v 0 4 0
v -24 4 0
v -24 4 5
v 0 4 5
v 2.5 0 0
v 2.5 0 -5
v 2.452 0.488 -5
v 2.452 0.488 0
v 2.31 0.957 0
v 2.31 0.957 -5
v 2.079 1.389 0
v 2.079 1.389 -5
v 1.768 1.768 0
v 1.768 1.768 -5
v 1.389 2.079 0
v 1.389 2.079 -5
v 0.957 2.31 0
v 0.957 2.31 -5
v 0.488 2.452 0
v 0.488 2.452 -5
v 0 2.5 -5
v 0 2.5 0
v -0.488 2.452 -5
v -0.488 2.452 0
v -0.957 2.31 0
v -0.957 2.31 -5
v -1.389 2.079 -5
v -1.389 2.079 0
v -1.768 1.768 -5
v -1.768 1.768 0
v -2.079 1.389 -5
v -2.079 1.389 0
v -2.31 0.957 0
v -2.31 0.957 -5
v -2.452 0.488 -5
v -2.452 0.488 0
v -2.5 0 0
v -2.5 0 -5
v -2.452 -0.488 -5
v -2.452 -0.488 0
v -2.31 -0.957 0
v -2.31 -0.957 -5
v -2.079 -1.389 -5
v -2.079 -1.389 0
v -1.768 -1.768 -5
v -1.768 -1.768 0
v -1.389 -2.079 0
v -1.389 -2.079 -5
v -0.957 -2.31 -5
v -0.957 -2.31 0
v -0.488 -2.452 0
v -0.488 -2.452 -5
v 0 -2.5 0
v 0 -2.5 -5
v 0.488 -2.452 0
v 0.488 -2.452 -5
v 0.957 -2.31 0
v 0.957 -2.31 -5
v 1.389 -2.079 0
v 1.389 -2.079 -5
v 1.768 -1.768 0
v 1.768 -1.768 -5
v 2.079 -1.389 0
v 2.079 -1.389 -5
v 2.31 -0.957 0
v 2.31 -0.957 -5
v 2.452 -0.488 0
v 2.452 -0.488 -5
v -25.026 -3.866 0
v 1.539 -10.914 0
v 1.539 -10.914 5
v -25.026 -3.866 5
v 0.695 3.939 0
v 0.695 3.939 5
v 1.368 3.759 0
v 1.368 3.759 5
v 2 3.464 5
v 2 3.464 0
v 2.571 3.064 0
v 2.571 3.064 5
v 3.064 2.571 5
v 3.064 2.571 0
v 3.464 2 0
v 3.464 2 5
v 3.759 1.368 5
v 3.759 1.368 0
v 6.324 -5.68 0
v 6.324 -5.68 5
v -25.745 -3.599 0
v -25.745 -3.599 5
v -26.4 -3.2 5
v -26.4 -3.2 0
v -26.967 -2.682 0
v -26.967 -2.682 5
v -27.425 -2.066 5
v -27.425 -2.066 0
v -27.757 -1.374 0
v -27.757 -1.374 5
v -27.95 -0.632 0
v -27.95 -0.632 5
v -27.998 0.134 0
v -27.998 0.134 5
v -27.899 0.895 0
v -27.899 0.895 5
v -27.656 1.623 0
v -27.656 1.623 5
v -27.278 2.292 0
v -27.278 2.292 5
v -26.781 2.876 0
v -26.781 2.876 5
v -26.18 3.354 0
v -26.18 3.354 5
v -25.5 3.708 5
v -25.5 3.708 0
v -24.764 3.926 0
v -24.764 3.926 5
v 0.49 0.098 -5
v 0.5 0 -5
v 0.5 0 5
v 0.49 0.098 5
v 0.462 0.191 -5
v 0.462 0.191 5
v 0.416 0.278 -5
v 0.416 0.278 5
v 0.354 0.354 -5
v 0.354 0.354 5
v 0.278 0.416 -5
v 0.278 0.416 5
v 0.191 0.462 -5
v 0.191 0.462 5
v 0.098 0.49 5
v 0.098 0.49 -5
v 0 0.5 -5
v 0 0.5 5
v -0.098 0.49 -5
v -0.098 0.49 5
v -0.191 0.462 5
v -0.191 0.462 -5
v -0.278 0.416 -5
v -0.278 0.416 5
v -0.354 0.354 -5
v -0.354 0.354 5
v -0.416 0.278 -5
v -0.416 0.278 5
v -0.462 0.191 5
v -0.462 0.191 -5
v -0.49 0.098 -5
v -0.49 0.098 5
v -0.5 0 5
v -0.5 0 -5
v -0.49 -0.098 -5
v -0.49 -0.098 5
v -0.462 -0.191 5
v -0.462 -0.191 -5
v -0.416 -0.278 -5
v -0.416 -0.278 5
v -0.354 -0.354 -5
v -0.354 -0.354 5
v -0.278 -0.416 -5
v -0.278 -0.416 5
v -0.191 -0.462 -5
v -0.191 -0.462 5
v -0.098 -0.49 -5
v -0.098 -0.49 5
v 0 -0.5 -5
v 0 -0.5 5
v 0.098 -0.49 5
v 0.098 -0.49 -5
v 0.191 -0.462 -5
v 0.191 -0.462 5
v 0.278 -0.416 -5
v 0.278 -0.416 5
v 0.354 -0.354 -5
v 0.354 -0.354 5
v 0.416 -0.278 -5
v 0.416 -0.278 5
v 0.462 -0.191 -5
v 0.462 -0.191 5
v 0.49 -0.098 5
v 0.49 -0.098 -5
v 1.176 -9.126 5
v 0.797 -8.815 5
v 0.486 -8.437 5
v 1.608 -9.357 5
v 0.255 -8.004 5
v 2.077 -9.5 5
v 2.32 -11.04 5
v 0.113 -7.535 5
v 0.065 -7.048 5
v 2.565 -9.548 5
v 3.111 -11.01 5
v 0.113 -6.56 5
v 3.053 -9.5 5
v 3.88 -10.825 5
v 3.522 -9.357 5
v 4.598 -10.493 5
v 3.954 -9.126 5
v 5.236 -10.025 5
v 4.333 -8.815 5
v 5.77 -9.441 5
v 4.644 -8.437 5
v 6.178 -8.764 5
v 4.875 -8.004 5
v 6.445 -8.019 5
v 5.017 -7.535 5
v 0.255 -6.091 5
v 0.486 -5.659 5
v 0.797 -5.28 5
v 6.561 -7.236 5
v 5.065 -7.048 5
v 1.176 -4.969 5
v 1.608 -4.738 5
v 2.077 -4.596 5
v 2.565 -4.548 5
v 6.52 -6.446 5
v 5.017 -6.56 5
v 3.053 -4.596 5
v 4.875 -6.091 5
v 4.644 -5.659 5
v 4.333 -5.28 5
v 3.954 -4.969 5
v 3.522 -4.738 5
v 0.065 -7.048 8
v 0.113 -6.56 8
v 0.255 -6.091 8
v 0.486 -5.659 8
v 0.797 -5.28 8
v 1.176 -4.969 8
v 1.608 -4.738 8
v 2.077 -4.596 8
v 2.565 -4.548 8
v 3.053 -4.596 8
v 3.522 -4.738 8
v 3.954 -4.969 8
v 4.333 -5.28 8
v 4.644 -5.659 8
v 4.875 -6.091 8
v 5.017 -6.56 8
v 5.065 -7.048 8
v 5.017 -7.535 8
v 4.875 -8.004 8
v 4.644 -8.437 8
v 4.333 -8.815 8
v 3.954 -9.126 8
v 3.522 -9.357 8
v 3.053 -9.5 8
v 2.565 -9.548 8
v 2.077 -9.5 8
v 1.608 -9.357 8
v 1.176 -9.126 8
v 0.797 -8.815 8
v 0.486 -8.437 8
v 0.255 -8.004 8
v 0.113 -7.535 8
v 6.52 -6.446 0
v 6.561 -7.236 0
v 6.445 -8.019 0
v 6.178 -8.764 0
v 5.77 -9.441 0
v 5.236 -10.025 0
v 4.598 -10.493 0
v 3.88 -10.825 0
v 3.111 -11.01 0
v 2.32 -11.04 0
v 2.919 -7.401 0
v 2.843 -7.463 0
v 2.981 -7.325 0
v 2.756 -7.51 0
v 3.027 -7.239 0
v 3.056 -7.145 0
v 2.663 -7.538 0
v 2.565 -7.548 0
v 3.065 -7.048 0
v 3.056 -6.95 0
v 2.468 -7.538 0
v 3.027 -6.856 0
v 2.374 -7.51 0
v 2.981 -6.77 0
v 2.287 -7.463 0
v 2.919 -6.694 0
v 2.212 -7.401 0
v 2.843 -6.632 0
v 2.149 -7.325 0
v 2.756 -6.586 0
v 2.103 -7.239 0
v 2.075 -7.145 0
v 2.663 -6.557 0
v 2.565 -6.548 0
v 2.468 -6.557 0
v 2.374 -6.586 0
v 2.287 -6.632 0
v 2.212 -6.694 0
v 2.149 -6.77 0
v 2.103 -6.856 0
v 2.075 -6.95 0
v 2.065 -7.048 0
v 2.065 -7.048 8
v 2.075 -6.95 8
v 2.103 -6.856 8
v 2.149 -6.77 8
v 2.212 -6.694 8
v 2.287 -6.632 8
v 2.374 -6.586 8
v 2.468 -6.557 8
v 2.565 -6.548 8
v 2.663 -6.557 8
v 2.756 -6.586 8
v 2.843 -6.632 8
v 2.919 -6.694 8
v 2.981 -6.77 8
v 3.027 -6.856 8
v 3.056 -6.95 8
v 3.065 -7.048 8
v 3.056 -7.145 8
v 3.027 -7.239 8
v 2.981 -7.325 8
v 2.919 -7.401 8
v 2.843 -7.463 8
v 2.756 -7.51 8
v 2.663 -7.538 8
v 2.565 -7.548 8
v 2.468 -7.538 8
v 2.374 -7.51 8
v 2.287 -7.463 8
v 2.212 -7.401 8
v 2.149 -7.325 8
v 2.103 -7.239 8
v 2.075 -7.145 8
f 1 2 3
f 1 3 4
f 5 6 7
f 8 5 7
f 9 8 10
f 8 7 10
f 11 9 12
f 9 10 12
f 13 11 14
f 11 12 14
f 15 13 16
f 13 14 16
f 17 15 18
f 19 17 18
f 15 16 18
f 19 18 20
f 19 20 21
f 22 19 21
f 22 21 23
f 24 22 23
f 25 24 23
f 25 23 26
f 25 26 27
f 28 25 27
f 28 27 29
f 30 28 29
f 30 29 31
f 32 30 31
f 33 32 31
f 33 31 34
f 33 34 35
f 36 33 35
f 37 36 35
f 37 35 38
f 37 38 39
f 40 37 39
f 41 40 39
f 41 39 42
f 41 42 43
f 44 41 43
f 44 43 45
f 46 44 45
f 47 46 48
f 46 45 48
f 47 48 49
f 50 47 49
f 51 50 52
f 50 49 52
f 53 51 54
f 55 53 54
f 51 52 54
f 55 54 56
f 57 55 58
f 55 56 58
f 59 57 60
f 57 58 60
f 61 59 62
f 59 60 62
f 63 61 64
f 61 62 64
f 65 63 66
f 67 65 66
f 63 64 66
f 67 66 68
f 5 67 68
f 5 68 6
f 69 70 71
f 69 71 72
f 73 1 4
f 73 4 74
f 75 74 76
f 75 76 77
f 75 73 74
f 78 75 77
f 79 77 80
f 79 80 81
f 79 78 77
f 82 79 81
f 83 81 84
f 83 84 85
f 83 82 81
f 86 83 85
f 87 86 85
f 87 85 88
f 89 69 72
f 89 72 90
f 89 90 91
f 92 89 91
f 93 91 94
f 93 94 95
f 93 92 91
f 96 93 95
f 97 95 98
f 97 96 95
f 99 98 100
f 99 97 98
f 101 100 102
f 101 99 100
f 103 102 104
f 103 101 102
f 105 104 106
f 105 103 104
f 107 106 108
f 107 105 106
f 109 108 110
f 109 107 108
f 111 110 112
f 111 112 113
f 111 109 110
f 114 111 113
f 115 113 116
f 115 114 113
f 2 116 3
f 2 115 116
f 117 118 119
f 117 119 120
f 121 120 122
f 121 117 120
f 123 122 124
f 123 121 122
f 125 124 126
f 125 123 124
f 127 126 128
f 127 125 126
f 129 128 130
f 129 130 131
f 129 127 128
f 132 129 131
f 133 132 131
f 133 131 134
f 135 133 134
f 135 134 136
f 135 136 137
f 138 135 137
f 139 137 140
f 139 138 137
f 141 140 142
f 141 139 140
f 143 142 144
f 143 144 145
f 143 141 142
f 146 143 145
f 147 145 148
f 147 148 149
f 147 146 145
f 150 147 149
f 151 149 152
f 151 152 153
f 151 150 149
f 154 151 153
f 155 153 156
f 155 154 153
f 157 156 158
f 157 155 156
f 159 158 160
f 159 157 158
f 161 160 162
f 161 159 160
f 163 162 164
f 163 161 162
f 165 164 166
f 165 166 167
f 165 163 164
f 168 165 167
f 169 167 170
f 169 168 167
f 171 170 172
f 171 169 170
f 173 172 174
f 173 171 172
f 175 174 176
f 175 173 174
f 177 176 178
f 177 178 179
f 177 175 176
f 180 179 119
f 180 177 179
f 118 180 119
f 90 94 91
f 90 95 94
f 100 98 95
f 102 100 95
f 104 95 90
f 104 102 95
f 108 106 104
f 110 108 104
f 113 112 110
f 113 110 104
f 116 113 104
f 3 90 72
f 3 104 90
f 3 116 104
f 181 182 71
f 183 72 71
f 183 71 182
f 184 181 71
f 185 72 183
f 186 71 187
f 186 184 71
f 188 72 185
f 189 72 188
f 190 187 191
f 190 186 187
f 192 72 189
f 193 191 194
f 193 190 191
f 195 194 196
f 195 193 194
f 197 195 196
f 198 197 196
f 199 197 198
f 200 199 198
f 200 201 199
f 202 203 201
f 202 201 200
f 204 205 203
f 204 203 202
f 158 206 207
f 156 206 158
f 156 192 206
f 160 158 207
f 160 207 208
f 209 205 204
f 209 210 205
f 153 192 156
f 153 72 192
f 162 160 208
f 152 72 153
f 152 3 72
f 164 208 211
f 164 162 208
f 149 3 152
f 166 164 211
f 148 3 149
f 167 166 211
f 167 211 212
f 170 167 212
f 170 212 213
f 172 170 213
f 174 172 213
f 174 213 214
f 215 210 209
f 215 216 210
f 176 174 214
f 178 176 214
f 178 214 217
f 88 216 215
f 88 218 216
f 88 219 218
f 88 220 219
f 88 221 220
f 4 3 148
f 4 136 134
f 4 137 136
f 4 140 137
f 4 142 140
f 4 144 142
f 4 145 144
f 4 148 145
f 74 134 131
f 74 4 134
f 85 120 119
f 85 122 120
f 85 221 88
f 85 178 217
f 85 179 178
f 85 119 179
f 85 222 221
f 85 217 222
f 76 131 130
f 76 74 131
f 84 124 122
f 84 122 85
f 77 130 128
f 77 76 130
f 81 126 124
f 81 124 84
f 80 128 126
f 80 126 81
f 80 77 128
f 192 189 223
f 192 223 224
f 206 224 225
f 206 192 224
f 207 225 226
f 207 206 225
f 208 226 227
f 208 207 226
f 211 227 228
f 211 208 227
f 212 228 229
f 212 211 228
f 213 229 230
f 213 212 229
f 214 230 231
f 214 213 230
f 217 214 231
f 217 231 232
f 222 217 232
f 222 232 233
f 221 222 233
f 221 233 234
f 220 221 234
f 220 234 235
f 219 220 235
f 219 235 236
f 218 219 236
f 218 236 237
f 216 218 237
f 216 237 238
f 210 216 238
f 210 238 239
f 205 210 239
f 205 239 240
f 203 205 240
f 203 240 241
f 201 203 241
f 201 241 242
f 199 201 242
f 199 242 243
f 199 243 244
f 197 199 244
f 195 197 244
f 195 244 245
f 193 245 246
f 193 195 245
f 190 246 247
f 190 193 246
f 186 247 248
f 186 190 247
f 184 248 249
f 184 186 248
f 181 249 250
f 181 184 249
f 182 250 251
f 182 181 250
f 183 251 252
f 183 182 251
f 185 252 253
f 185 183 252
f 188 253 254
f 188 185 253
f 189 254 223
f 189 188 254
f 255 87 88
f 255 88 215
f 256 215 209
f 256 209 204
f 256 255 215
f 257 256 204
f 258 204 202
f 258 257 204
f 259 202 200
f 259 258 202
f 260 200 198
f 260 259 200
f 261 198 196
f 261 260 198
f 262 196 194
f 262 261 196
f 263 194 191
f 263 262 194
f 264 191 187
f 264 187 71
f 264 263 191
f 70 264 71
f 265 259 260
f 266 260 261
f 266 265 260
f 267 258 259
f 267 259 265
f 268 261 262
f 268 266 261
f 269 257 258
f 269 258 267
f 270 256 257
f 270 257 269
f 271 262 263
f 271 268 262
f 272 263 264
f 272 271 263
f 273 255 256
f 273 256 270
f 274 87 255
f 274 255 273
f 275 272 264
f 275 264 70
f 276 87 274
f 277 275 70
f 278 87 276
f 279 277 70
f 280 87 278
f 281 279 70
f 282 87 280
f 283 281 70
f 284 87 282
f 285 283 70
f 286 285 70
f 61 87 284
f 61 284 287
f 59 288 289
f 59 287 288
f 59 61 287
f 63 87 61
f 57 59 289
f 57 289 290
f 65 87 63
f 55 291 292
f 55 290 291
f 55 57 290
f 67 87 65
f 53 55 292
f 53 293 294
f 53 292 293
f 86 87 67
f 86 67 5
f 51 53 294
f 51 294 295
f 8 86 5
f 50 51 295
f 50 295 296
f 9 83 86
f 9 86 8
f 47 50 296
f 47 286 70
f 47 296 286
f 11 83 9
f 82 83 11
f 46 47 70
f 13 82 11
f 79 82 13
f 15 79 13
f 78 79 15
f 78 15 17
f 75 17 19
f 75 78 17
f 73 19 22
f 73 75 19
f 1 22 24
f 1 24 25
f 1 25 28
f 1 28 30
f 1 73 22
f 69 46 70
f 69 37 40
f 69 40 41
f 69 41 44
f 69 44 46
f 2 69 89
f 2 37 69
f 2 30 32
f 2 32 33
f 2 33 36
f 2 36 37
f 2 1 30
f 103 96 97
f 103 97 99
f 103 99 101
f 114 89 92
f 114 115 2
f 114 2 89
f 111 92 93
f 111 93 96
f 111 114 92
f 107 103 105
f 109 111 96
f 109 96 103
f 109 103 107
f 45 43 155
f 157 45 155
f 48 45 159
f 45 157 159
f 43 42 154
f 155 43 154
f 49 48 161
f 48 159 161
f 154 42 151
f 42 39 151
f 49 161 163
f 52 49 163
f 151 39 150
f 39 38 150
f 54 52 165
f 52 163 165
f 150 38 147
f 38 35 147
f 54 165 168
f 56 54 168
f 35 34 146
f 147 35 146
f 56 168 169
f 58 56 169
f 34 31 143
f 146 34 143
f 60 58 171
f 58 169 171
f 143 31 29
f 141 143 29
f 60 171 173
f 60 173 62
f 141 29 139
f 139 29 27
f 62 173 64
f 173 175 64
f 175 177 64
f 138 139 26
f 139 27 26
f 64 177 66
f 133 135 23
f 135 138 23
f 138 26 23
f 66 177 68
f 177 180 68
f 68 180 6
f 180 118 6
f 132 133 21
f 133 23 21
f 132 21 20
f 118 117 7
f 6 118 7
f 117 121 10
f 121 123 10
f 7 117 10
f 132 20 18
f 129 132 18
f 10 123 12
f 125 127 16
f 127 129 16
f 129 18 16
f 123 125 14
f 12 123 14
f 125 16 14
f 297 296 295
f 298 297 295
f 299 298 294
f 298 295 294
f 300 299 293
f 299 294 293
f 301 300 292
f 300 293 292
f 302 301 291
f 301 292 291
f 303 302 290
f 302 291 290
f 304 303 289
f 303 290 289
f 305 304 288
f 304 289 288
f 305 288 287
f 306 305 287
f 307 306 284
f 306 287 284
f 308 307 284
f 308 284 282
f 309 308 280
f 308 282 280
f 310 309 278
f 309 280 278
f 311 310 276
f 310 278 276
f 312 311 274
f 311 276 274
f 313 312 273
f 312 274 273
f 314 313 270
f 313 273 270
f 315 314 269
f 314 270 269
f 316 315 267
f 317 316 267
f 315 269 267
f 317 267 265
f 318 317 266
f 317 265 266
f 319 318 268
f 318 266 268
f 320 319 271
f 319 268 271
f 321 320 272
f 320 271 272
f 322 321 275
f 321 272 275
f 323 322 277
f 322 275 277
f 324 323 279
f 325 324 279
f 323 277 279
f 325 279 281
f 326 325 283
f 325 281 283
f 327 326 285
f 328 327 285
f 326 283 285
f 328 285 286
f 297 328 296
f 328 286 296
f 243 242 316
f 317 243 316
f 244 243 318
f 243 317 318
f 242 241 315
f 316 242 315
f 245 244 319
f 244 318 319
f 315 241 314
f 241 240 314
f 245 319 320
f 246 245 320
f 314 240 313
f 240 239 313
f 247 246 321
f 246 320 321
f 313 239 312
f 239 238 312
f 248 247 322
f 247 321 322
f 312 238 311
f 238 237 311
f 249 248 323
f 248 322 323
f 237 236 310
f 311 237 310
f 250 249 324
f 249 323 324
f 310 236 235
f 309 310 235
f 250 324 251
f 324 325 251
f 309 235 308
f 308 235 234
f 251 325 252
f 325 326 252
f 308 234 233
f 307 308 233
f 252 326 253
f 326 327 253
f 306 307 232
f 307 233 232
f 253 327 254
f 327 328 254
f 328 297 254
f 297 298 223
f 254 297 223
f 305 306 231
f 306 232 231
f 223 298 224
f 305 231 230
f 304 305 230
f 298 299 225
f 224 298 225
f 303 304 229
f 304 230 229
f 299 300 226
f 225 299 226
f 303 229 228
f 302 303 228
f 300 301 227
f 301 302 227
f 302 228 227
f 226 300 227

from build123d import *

# Parameters (mm, degrees)
SKETCH2_R           = 2.5
BOSS_EXTRUDE1_DEPTH = 5
BOSS_EXTRUDE2_START = -10
SKETCH3_R           = 2.5
SKETCH3_R_2         = 0.5
BOSS_EXTRUDE2_DEPTH = 10
SKETCH4_R           = 2.5
SKETCH4_R_2         = 0.5
BOSS_EXTRUDE3_DEPTH = 8
SKETCH5_R           = 2.5
BOSS_EXTRUDE4_DEPTH = 5


with BuildPart() as part:
    # Sketch2 → Boss-Extrude1 (new body)
    with BuildSketch(Plane.XY):
        with BuildLine():
            Line((-24, 4), (0, 4))
            ThreePointArc((0, 4), (2.294305745, 3.276608177), (3.758770483, 1.368080573))
            Line((3.758770483, 1.368080573), (6.323921558, -5.679614083))
            ThreePointArc((6.323921558, -5.679614083), (5.517602021, -9.746404239), (1.539439822, -10.913948195))
            Line((1.539439822, -10.913948195), (-25.025711253, -3.866253539))
            ThreePointArc((-25.025711253, -3.866253539), (-27.966422453, 0.51719718), (-24, 4))
        make_face()
        with Locations((-24, 0)):
            Circle(SKETCH2_R, mode=Mode.SUBTRACT)
        Circle(SKETCH2_R, mode=Mode.SUBTRACT)
        with Locations((2.565151075, -7.047694656)):
            Circle(SKETCH2_R, mode=Mode.SUBTRACT)
    extrude(amount=BOSS_EXTRUDE1_DEPTH)

    # Sketch3 → Boss-Extrude2 (add)
    with BuildSketch(Plane.XY.offset(5).offset(BOSS_EXTRUDE2_START)):
        Circle(SKETCH3_R)
        Circle(SKETCH3_R_2, mode=Mode.SUBTRACT)
    extrude(amount=BOSS_EXTRUDE2_DEPTH)

    # Sketch4 → Boss-Extrude3 (add)
    with BuildSketch(Plane(origin=(0, 0, 0), x_dir=(-1, 0, 0), z_dir=(0, 0, -1))):
        with Locations((-2.565151075, -7.047694656)):
            Circle(SKETCH4_R)
        with Locations((-2.565151075, -7.047694656)):
            Circle(SKETCH4_R_2, mode=Mode.SUBTRACT)
    extrude(amount=-BOSS_EXTRUDE3_DEPTH)

    # Sketch5 → Boss-Extrude4 (add)
    with BuildSketch(Plane(origin=(0, 0, 0), x_dir=(-1, 0, 0), z_dir=(0, 0, -1))):
        with Locations((24, 0)):
            Circle(SKETCH5_R)
    extrude(amount=-BOSS_EXTRUDE4_DEPTH)


solid = part.part
